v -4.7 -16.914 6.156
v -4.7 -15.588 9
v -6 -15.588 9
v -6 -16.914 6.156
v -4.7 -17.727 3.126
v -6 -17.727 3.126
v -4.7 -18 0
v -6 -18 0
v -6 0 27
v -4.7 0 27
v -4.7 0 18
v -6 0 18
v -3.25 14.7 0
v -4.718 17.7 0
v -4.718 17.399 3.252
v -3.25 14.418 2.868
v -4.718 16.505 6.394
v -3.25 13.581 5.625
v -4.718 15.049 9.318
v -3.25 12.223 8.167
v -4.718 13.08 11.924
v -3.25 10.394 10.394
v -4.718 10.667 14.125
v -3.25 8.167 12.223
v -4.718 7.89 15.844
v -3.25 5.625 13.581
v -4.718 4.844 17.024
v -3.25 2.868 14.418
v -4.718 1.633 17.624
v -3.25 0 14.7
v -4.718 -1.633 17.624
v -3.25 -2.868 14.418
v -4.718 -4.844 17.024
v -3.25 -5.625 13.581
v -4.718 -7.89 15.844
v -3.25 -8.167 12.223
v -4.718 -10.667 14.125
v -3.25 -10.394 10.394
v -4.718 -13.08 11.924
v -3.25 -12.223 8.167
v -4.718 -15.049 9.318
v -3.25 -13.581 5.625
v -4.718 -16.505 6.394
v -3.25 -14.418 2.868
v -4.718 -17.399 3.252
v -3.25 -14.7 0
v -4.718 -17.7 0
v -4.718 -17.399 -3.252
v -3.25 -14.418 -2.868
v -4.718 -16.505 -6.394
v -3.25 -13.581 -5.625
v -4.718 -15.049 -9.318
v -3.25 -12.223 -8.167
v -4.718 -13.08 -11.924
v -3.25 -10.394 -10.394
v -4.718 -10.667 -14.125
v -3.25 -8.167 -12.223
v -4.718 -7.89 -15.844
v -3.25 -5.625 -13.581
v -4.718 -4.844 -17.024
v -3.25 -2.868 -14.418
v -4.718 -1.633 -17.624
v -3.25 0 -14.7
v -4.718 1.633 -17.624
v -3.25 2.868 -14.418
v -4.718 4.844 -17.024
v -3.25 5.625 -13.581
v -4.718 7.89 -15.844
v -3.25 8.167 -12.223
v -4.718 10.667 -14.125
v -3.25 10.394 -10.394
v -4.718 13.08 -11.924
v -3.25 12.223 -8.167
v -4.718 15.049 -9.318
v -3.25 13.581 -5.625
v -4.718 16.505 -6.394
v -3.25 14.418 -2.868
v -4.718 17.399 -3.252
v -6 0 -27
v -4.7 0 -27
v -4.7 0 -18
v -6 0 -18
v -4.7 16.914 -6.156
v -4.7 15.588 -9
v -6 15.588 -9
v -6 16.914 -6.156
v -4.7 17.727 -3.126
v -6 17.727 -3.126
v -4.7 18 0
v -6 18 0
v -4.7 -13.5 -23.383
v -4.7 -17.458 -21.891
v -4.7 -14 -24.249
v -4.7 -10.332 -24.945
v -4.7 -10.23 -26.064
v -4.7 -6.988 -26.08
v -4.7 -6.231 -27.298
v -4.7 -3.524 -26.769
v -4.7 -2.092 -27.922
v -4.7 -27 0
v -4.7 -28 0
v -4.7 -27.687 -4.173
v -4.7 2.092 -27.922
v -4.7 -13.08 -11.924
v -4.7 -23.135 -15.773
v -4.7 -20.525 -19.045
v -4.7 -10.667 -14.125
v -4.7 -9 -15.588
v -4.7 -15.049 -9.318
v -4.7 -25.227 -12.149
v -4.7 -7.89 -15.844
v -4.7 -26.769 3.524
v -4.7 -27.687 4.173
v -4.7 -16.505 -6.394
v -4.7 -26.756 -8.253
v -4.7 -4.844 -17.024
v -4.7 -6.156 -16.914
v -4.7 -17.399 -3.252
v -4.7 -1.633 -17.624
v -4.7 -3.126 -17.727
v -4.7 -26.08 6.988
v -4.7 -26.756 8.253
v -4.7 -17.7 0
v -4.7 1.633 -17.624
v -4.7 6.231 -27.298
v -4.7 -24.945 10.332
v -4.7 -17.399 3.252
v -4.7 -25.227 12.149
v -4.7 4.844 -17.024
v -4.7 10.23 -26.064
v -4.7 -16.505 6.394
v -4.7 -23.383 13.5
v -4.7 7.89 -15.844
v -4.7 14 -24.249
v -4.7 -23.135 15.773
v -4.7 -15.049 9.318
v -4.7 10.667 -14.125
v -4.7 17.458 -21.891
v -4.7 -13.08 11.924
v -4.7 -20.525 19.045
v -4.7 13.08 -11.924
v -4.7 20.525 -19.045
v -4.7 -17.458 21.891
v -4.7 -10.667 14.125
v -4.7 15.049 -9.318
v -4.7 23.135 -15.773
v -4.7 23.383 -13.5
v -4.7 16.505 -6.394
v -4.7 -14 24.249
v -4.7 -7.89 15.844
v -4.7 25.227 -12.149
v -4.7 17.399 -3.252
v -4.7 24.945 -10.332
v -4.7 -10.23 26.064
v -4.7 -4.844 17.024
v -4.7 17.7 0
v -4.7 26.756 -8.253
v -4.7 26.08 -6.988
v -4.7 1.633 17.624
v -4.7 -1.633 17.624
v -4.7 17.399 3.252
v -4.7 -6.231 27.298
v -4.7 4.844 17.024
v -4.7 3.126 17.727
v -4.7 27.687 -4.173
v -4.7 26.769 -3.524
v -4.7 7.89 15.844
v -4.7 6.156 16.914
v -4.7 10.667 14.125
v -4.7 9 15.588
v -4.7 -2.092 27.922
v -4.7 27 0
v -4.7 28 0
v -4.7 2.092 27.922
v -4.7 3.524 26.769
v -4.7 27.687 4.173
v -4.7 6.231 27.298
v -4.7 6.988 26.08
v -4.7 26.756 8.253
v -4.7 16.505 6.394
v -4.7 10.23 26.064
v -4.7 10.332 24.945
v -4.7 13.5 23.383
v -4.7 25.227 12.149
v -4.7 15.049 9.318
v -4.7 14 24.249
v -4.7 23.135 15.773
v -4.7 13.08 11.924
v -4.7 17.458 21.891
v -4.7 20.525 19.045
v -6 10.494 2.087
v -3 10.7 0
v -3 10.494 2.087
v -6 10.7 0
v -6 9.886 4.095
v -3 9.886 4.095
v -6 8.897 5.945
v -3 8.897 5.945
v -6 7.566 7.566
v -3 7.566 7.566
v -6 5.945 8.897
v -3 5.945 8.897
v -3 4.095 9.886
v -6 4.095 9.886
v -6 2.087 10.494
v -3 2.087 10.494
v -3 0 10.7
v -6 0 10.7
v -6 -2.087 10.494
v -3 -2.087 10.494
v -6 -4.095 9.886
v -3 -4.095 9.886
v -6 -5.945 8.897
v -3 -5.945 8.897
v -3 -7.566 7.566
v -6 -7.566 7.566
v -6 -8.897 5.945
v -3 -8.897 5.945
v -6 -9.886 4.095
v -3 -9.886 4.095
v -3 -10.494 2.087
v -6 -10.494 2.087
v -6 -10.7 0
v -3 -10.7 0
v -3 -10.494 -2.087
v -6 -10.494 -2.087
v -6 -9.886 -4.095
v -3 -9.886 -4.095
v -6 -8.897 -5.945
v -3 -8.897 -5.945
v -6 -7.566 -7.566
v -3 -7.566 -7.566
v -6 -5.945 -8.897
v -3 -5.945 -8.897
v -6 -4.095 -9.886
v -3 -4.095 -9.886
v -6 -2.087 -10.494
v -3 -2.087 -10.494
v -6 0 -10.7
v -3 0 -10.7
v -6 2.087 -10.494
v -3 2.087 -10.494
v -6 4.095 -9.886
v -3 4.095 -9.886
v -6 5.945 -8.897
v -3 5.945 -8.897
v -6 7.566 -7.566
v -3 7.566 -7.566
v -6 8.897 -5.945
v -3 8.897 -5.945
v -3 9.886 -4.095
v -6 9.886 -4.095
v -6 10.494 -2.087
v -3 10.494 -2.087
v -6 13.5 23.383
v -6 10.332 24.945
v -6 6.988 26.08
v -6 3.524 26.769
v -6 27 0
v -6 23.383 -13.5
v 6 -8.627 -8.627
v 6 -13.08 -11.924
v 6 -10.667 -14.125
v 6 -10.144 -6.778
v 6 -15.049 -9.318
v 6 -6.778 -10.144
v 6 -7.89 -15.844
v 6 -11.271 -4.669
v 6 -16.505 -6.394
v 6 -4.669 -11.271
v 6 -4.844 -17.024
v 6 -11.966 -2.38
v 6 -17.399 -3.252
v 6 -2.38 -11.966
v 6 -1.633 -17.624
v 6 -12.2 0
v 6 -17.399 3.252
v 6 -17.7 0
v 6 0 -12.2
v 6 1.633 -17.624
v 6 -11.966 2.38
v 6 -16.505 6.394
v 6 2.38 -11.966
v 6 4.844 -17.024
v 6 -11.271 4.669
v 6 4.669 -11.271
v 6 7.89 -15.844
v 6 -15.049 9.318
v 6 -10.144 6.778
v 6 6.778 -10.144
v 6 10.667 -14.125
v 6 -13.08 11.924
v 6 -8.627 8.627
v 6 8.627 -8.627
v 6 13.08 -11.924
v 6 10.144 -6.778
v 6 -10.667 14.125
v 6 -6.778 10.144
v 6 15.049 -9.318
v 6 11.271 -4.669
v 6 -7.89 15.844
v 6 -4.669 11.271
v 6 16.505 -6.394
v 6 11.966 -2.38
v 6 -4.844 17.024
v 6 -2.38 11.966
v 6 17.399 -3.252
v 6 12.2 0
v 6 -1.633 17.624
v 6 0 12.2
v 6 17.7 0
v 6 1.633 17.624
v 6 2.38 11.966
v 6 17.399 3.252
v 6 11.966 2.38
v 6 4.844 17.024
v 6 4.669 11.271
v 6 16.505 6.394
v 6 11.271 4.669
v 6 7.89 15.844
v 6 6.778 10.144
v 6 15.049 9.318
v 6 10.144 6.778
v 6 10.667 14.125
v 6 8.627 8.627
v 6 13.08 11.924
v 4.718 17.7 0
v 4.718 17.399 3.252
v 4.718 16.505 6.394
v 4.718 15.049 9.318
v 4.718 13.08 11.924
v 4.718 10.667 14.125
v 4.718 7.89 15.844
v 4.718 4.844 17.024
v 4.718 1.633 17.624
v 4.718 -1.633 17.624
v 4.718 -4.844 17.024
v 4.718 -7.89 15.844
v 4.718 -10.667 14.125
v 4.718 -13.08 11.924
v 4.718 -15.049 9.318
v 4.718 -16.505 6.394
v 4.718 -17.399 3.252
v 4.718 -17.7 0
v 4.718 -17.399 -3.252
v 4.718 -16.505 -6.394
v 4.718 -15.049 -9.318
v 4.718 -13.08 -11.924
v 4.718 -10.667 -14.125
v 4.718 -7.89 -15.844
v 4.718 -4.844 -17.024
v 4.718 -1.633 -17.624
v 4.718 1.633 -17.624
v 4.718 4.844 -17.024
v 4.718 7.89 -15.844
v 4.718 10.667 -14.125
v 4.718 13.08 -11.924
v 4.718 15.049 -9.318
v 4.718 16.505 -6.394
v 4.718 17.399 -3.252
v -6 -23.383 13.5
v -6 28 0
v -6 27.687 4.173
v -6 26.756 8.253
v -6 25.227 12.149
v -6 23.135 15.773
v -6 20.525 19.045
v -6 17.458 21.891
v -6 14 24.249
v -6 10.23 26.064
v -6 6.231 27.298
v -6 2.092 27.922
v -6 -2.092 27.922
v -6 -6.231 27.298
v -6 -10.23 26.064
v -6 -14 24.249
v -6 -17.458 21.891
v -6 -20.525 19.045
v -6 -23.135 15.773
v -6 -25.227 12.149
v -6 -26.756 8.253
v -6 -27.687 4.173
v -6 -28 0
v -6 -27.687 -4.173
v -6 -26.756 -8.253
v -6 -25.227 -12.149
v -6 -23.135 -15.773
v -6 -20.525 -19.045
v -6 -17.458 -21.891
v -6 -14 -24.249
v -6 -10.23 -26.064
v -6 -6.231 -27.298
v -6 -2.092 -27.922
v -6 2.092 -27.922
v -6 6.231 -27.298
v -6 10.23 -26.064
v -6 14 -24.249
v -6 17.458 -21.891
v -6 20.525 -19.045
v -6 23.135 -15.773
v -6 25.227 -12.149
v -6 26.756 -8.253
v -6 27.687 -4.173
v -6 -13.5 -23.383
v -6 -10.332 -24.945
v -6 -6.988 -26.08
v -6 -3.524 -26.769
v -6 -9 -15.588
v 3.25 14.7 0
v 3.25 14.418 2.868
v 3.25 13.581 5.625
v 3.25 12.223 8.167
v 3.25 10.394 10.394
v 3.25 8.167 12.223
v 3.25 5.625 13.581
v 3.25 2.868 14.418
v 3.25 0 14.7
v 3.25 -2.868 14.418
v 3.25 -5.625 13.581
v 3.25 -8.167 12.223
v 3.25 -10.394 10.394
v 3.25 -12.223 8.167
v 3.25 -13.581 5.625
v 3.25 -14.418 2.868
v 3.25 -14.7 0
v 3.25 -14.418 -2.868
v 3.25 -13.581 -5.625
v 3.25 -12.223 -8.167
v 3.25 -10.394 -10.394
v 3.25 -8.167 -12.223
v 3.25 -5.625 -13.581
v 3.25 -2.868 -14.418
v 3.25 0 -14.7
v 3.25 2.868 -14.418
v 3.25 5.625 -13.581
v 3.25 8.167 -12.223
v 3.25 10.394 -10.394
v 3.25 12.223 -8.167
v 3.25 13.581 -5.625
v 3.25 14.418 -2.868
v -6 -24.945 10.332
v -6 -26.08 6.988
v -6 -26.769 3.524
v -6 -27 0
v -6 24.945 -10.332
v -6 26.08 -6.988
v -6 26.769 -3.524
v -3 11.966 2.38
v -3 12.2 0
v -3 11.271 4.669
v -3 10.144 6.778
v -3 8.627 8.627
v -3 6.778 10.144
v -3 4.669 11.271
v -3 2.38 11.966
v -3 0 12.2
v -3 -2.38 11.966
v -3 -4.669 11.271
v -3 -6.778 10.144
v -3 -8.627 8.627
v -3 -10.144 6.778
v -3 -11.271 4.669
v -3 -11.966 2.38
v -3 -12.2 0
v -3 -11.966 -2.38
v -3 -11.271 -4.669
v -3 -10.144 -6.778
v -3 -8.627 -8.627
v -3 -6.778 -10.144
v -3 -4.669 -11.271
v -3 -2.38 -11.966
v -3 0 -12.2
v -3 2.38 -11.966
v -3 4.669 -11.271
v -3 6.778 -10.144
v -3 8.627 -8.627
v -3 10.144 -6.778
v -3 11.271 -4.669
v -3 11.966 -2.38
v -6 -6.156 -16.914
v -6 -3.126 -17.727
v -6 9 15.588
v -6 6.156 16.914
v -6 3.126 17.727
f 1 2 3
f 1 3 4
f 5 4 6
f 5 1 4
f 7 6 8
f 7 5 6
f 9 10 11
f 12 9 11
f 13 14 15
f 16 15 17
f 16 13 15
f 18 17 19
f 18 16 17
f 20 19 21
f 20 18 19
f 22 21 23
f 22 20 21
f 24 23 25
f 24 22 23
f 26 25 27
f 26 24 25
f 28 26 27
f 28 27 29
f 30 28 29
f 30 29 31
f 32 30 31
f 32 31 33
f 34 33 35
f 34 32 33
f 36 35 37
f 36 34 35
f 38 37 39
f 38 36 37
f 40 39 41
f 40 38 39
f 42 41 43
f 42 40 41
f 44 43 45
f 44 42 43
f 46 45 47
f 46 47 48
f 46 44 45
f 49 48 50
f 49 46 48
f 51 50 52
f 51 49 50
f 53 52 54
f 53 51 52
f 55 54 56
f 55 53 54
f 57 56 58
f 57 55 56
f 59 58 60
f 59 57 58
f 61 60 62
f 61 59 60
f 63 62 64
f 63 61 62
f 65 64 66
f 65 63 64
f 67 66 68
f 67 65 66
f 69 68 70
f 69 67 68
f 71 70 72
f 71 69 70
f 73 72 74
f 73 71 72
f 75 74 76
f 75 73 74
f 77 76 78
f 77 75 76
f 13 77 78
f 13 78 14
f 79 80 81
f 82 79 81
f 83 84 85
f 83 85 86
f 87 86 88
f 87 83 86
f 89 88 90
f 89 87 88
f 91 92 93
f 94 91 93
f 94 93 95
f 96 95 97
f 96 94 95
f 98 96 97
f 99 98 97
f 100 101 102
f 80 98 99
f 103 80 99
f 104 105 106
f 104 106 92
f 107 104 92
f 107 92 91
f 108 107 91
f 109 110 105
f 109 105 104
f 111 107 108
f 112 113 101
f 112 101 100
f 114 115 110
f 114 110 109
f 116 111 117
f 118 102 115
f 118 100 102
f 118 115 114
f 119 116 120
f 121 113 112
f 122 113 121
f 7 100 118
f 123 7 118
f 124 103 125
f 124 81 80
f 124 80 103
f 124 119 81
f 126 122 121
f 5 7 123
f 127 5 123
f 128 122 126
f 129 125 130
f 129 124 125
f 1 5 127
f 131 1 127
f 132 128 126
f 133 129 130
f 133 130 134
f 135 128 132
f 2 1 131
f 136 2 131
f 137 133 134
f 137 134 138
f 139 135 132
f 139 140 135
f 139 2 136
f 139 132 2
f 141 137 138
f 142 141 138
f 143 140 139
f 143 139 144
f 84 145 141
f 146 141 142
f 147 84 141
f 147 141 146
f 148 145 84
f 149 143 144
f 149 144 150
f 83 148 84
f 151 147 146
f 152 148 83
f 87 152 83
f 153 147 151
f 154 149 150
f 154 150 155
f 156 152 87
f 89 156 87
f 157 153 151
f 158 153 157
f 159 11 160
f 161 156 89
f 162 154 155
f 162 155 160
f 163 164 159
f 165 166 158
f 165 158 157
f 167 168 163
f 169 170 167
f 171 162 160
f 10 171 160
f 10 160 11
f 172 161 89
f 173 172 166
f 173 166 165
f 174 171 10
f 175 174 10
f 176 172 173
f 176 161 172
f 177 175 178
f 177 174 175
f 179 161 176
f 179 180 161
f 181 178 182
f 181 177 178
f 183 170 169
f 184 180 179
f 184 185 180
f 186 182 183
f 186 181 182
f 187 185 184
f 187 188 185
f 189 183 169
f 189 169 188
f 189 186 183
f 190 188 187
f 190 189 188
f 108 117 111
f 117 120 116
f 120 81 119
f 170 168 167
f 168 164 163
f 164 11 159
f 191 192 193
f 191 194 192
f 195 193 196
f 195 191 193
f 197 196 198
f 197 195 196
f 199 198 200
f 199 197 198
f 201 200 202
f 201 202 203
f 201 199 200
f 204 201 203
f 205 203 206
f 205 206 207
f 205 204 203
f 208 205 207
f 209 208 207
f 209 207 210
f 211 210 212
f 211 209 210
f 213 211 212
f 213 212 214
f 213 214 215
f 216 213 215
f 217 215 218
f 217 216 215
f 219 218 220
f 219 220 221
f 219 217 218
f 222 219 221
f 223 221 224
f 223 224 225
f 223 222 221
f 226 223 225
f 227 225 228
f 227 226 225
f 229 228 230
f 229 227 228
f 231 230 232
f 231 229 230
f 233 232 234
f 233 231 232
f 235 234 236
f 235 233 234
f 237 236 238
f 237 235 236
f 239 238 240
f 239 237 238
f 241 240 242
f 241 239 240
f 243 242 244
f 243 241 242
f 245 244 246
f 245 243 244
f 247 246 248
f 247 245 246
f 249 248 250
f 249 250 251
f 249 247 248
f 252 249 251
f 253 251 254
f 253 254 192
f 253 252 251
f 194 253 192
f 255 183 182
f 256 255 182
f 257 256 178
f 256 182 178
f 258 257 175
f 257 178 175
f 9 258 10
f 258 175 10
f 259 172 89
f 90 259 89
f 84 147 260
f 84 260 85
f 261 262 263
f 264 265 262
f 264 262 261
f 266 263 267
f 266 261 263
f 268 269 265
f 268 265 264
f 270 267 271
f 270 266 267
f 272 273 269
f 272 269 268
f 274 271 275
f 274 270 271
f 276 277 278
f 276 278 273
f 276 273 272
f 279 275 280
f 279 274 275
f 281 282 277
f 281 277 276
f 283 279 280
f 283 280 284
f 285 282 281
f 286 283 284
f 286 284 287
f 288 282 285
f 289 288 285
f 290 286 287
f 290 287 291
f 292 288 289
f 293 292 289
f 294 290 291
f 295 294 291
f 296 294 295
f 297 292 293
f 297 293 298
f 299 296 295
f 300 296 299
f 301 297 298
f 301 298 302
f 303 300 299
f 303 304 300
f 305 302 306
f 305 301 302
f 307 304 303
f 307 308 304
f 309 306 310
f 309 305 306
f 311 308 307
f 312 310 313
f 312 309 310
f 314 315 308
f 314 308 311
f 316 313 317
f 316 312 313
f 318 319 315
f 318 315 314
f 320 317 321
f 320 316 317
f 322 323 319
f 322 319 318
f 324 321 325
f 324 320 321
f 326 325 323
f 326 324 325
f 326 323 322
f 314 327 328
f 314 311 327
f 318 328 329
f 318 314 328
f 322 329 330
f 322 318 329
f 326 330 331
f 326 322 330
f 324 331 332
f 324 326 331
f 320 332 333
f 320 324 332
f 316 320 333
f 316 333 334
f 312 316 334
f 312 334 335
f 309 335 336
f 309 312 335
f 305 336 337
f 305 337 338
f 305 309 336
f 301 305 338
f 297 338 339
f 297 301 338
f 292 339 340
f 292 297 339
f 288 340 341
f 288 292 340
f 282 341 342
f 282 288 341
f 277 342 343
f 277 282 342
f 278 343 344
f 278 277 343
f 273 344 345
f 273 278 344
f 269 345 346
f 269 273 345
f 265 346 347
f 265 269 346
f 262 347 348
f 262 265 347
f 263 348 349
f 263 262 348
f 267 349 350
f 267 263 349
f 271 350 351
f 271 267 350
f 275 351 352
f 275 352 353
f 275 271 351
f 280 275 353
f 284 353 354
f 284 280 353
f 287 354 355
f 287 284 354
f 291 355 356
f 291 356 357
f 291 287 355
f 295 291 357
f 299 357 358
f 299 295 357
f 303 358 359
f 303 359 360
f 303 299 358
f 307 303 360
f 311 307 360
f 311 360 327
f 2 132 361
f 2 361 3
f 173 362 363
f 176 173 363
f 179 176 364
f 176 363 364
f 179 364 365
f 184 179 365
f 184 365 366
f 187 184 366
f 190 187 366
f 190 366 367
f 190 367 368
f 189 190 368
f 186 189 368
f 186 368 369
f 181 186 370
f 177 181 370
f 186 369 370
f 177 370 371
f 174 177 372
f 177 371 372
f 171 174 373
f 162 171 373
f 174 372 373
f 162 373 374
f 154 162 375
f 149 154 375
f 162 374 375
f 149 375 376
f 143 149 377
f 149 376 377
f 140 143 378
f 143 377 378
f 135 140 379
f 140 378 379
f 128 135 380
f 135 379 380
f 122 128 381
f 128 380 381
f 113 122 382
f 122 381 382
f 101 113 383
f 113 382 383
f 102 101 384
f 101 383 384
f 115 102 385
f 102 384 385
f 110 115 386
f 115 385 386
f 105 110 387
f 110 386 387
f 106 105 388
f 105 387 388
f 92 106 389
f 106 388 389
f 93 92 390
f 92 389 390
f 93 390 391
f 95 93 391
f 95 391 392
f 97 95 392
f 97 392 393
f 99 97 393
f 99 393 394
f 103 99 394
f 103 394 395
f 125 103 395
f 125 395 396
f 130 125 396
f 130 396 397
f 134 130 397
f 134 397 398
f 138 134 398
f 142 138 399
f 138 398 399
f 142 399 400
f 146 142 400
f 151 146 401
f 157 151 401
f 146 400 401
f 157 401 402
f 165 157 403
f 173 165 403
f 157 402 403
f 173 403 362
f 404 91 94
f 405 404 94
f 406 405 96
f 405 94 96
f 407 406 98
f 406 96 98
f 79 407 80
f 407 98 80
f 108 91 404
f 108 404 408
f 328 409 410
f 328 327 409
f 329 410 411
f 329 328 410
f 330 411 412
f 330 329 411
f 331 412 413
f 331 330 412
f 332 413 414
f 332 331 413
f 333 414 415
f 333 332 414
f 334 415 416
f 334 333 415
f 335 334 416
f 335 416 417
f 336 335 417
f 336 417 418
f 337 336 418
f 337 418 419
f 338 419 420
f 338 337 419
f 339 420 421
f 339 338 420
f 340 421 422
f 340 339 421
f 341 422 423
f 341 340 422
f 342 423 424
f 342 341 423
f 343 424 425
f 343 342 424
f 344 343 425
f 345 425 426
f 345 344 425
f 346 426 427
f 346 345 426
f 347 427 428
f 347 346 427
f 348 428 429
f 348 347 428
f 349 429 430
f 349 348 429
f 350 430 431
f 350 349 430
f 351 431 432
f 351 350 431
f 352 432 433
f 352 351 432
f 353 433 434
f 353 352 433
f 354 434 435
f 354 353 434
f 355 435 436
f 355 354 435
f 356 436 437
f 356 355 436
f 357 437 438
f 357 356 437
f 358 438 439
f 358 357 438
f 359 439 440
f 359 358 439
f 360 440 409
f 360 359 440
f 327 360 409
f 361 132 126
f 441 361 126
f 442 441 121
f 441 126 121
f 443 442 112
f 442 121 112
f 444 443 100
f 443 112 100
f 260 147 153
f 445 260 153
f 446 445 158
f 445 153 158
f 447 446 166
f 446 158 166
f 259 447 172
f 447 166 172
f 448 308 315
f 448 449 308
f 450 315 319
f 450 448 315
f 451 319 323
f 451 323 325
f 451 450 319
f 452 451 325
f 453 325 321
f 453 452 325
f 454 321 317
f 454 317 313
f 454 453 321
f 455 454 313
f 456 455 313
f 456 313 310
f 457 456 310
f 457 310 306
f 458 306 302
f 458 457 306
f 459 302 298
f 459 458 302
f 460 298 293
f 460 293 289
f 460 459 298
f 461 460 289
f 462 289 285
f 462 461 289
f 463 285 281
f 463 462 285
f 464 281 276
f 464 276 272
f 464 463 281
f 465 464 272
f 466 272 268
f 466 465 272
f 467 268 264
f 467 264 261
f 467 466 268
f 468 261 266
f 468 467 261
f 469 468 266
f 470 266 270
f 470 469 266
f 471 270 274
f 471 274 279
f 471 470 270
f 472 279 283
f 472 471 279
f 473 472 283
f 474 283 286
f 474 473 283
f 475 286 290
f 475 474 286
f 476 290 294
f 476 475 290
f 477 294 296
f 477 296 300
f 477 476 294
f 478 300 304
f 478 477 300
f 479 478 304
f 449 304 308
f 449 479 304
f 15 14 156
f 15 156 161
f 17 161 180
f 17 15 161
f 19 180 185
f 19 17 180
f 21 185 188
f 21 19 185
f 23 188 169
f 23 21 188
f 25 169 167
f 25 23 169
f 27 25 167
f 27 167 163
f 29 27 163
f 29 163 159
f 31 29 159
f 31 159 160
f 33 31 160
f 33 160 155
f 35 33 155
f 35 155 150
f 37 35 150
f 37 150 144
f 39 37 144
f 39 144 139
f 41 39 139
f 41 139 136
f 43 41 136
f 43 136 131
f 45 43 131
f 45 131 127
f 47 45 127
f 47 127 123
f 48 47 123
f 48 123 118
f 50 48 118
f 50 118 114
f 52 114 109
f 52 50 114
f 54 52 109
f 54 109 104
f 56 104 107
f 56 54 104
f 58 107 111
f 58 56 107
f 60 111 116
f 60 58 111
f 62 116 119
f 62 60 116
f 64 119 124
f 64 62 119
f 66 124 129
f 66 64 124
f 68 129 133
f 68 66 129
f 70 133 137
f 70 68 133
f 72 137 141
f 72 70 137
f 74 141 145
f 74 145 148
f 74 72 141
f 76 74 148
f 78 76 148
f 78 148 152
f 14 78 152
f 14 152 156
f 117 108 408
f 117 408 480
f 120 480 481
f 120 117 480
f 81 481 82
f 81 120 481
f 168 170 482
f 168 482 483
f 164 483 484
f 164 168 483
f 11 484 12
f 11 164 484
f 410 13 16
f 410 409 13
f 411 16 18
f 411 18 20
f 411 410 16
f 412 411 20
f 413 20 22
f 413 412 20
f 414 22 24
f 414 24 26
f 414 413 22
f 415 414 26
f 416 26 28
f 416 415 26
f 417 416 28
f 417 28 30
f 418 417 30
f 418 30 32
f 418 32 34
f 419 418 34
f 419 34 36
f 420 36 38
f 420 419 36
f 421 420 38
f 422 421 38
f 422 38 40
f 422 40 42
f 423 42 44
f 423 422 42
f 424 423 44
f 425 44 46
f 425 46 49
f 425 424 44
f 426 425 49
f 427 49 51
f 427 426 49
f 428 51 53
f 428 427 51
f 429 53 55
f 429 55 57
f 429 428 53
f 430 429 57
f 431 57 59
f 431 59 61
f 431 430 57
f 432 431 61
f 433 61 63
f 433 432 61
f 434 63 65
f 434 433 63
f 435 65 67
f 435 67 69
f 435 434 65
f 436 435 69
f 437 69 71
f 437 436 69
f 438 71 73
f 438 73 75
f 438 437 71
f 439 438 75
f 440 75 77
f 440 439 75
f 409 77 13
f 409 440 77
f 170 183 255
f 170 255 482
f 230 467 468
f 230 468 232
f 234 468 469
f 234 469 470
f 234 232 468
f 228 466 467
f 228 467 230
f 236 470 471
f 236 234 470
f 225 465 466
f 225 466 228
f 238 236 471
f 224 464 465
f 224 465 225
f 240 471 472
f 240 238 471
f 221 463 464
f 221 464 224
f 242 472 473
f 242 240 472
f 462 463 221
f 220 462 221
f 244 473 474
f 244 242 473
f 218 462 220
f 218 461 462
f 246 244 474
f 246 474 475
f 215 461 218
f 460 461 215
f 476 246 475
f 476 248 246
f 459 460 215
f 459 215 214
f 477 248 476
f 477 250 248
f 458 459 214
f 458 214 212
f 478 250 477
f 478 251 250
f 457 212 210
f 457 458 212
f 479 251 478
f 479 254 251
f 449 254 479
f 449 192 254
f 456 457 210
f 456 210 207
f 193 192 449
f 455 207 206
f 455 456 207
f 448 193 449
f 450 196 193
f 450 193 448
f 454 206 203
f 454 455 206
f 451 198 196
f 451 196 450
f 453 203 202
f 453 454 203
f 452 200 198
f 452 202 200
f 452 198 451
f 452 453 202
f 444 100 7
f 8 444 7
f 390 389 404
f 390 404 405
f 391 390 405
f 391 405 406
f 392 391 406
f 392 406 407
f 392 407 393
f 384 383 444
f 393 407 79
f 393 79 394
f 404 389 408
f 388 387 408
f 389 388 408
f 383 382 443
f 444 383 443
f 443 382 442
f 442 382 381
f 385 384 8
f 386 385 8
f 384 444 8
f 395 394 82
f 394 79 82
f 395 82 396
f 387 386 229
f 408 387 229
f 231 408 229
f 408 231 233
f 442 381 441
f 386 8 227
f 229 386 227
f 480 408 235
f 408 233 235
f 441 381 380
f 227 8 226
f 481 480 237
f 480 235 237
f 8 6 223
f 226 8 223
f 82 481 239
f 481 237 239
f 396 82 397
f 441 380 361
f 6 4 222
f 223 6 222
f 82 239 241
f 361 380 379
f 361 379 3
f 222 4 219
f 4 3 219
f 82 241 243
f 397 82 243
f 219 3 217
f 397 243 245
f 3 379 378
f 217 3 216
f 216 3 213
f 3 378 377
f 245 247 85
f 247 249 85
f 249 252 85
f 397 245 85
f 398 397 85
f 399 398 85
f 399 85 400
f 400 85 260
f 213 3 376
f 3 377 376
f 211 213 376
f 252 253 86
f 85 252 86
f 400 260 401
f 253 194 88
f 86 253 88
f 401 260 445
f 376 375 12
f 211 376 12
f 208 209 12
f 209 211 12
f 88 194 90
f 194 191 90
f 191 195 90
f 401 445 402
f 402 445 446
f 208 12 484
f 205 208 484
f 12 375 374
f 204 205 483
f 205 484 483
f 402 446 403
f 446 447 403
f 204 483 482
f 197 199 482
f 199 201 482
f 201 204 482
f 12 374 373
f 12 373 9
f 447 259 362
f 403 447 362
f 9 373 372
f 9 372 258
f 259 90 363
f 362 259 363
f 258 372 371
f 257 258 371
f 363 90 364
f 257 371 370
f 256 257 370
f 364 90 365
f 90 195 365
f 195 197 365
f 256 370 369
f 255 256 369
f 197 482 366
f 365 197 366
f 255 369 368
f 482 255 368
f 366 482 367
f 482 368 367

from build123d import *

# Parameters (mm, degrees)
SKETCH001_R        = 28
SKETCH001_R_2      = 17.7
PAD_DEPTH          = 1.3
POCKET_DEPTH       = 159.714257
POLARPATTERN_COUNT = 4


with BuildPart() as body001:
    # Sketch001 → Pad (new body)
    with BuildSketch(Plane.YZ):
        Circle(SKETCH001_R)
        Circle(SKETCH001_R_2, mode=Mode.SUBTRACT)
    extrude(amount=PAD_DEPTH)

    # Sketch002 (on Face4 of Pad) → Pocket (cut, through all)
    with BuildSketch(Plane.YZ.offset(1.3)):
        with BuildLine():
            ThreePointArc((-23.382686, 13.5), (-26.079997, 6.988114), (-27, 0))
            Line((-27, 0), (-18, 0))
            ThreePointArc((-15.588457, 9), (-17.386665, 4.658743), (-18, 0))
            Line((-23.382686, 13.5), (-15.588457, 9))
        make_face()
    pocket = extrude(amount=-POCKET_DEPTH, mode=Mode.SUBTRACT)

    # PolarPattern: Pocket ×4 about axis
    polarpattern_axis = Axis((0, 0, 0), (1, 0, 0))
    for i in range(1, POLARPATTERN_COUNT):
        add(pocket.rotate(polarpattern_axis, i * 360 / POLARPATTERN_COUNT), mode=Mode.SUBTRACT)


with BuildPart() as body001_1:
    # Body001 placement: moved
    add(body001.part.moved(Location((-6, 0, 0))))


with BuildPart() as fusion:
    # Sketch → Revolution (revolve)
    with BuildSketch(Plane.XY):
        Polygon((-6, 12.2), (-6, 17.7), (-4.717735, 17.7), (-3.25, 14.7), (3.25, 14.7), (4.717735, 17.7), (6, 17.7), (6, 12.2), (-3, 12.2), (-3, 10.7), (-6, 10.7), align=None)
    revolve(axis=Axis((0, 0, 0), (1, 0, 0)))

    # Fusion: union Body001
    add(body001_1.part)


solid = fusion.part
